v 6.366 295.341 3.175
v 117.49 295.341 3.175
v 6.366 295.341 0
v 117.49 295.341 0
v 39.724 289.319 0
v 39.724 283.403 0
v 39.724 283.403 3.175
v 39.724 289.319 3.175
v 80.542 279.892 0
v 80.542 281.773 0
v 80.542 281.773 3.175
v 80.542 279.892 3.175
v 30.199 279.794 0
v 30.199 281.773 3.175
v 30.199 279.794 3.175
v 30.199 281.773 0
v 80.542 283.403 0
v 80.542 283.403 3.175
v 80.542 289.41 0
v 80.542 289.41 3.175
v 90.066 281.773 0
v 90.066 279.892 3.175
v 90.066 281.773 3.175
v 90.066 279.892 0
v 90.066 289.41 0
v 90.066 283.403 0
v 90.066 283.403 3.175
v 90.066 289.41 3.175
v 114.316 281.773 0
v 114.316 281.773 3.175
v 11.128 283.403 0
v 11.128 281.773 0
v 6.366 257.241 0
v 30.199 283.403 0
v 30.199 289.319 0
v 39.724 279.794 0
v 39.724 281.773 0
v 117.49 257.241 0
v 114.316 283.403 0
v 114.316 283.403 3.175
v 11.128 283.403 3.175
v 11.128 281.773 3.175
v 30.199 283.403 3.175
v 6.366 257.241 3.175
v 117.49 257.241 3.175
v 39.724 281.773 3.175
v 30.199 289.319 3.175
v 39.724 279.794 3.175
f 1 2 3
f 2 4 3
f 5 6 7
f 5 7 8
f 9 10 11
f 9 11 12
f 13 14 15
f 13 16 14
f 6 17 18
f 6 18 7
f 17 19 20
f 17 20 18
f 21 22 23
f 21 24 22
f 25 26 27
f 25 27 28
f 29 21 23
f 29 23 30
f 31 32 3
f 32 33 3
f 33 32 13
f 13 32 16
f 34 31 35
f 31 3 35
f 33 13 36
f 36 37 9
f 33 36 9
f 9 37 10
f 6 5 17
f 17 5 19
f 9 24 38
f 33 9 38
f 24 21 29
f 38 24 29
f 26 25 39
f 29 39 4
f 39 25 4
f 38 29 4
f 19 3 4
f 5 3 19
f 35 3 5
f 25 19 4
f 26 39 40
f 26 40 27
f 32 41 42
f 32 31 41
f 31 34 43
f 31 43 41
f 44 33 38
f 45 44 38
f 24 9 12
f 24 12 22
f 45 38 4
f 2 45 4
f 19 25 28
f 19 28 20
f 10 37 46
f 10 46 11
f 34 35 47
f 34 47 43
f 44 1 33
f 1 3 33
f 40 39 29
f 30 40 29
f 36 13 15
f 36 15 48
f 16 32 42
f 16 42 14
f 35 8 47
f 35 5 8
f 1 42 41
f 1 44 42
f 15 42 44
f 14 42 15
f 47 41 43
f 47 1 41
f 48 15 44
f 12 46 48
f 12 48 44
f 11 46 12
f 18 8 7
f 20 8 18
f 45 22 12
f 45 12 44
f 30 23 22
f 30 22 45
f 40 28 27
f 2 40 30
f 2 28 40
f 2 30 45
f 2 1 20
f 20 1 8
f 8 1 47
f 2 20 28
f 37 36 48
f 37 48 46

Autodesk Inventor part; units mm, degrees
ref_plane "YZ Plane" through (0, 0, 0) normal (1, 0, 0) x (0, 1, 0)
ref_plane "XZ Plane" through (0, 0, 0) normal (0, 1, 0) x (-1, 0, 0)
ref_plane "XY Plane" through (0, 0, 0) normal (0, 0, 1) x (1, 0, 0)
sketch "Sketch1" plane through (0, 0, 0) normal (0, 0, 1) x (1, 0, 0)
  line L0 (117.4905, 295.341) -> (6.3655, 295.341)
  line L1 (6.3655, 295.341) -> (6.3655, 257.241)
  line L2 (6.3655, 257.241) -> (117.4905, 257.241)
  line L3 (117.4905, 257.241) -> (117.4905, 295.341)
  line L4 (117.4905, 283.403) -> (6.3655, 283.403)
  line L5 (6.3655, 283.403) -> (6.3655, 281.773)
  line L6 (6.3655, 281.773) -> (117.4905, 281.773)
  line L7 (117.4905, 281.773) -> (117.4905, 283.403)
  line L8 (117.4905, 281.773) -> (117.4905, 283.403)
  line L9 (6.3655, 283.403) -> (11.128, 283.403)
  line L10 (11.128, 283.403) -> (11.128, 281.773)
  line L11 (11.128, 281.773) -> (6.3655, 281.773)
  line L12 (6.3655, 281.773) -> (6.3655, 283.403)
  line L13 (117.4905, 283.403) -> (114.3155, 283.403)
  line L14 (114.3155, 283.403) -> (114.3155, 281.773)
  line L15 (114.3155, 281.773) -> (117.4905, 281.773)
  line L16 (117.4905, 281.773) -> (117.4905, 283.403)
  point P0 (0, 0)
  dimension "d0" = 38.1
  dimension "d1" = 111.125
  dimension "d2" = 1.63
  dimension "d3" = 11.938
  dimension "d23" = 103.1875
  dimension "d24" = 3.175
extrude "Extrusion1" add sketch "Sketch1" along normal blind 3.175 contours L3 L4 L1 L0 | L3 L6 L14 L4 | L4 L10 L6 L1 | L3 L2 L1 L6
sketch "Sketch2" plane through (0, 0, 0) normal (0, 0, -1) x (-1, 0, 0)
  line L0 (-114.3155, 283.403) -> (-11.128, 283.403) projected
  line L1 (-39.7237, 289.3188) -> (-30.1987, 289.3188)
  line L2 (-30.1987, 289.3188) -> (-30.1987, 279.7938)
  line L3 (-30.1987, 279.7938) -> (-39.7237, 279.7938)
  line L4 (-39.7237, 279.7938) -> (-39.7237, 289.3188)
  line L5 (-90.0665, 289.41) -> (-80.5415, 289.41)
  line L6 (-80.5415, 289.41) -> (-80.5415, 279.8923)
  line L7 (-80.5415, 279.8923) -> (-90.0665, 279.8923)
  line L8 (-90.0665, 279.8923) -> (-90.0665, 289.41)
  line L9 (-6.3655, 257.241) -> (-117.4905, 257.241) projected
  line L10 (-67.3255, 257.241) -> (-44.4655, 257.241)
  line L11 (-117.4905, 295.341) -> (-6.3655, 295.341) projected
  line L12 (-53.9905, 295.341) -> (-41.2905, 295.341)
  point P0 (0, 0)
  point P1 (-117.4905, 283.403)
  point P2 (-6.3655, 283.403)
  dimension "d8" = 9.525
  dimension "d9" = 9.5177
  dimension "d10" = 9.525
  dimension "d11" = 9.525
  dimension "d13" = 5.9159
extrude "Extrusion2" cut sketch "Sketch2" against normal blind 3.175
properties part number "FrontBulkhead"
